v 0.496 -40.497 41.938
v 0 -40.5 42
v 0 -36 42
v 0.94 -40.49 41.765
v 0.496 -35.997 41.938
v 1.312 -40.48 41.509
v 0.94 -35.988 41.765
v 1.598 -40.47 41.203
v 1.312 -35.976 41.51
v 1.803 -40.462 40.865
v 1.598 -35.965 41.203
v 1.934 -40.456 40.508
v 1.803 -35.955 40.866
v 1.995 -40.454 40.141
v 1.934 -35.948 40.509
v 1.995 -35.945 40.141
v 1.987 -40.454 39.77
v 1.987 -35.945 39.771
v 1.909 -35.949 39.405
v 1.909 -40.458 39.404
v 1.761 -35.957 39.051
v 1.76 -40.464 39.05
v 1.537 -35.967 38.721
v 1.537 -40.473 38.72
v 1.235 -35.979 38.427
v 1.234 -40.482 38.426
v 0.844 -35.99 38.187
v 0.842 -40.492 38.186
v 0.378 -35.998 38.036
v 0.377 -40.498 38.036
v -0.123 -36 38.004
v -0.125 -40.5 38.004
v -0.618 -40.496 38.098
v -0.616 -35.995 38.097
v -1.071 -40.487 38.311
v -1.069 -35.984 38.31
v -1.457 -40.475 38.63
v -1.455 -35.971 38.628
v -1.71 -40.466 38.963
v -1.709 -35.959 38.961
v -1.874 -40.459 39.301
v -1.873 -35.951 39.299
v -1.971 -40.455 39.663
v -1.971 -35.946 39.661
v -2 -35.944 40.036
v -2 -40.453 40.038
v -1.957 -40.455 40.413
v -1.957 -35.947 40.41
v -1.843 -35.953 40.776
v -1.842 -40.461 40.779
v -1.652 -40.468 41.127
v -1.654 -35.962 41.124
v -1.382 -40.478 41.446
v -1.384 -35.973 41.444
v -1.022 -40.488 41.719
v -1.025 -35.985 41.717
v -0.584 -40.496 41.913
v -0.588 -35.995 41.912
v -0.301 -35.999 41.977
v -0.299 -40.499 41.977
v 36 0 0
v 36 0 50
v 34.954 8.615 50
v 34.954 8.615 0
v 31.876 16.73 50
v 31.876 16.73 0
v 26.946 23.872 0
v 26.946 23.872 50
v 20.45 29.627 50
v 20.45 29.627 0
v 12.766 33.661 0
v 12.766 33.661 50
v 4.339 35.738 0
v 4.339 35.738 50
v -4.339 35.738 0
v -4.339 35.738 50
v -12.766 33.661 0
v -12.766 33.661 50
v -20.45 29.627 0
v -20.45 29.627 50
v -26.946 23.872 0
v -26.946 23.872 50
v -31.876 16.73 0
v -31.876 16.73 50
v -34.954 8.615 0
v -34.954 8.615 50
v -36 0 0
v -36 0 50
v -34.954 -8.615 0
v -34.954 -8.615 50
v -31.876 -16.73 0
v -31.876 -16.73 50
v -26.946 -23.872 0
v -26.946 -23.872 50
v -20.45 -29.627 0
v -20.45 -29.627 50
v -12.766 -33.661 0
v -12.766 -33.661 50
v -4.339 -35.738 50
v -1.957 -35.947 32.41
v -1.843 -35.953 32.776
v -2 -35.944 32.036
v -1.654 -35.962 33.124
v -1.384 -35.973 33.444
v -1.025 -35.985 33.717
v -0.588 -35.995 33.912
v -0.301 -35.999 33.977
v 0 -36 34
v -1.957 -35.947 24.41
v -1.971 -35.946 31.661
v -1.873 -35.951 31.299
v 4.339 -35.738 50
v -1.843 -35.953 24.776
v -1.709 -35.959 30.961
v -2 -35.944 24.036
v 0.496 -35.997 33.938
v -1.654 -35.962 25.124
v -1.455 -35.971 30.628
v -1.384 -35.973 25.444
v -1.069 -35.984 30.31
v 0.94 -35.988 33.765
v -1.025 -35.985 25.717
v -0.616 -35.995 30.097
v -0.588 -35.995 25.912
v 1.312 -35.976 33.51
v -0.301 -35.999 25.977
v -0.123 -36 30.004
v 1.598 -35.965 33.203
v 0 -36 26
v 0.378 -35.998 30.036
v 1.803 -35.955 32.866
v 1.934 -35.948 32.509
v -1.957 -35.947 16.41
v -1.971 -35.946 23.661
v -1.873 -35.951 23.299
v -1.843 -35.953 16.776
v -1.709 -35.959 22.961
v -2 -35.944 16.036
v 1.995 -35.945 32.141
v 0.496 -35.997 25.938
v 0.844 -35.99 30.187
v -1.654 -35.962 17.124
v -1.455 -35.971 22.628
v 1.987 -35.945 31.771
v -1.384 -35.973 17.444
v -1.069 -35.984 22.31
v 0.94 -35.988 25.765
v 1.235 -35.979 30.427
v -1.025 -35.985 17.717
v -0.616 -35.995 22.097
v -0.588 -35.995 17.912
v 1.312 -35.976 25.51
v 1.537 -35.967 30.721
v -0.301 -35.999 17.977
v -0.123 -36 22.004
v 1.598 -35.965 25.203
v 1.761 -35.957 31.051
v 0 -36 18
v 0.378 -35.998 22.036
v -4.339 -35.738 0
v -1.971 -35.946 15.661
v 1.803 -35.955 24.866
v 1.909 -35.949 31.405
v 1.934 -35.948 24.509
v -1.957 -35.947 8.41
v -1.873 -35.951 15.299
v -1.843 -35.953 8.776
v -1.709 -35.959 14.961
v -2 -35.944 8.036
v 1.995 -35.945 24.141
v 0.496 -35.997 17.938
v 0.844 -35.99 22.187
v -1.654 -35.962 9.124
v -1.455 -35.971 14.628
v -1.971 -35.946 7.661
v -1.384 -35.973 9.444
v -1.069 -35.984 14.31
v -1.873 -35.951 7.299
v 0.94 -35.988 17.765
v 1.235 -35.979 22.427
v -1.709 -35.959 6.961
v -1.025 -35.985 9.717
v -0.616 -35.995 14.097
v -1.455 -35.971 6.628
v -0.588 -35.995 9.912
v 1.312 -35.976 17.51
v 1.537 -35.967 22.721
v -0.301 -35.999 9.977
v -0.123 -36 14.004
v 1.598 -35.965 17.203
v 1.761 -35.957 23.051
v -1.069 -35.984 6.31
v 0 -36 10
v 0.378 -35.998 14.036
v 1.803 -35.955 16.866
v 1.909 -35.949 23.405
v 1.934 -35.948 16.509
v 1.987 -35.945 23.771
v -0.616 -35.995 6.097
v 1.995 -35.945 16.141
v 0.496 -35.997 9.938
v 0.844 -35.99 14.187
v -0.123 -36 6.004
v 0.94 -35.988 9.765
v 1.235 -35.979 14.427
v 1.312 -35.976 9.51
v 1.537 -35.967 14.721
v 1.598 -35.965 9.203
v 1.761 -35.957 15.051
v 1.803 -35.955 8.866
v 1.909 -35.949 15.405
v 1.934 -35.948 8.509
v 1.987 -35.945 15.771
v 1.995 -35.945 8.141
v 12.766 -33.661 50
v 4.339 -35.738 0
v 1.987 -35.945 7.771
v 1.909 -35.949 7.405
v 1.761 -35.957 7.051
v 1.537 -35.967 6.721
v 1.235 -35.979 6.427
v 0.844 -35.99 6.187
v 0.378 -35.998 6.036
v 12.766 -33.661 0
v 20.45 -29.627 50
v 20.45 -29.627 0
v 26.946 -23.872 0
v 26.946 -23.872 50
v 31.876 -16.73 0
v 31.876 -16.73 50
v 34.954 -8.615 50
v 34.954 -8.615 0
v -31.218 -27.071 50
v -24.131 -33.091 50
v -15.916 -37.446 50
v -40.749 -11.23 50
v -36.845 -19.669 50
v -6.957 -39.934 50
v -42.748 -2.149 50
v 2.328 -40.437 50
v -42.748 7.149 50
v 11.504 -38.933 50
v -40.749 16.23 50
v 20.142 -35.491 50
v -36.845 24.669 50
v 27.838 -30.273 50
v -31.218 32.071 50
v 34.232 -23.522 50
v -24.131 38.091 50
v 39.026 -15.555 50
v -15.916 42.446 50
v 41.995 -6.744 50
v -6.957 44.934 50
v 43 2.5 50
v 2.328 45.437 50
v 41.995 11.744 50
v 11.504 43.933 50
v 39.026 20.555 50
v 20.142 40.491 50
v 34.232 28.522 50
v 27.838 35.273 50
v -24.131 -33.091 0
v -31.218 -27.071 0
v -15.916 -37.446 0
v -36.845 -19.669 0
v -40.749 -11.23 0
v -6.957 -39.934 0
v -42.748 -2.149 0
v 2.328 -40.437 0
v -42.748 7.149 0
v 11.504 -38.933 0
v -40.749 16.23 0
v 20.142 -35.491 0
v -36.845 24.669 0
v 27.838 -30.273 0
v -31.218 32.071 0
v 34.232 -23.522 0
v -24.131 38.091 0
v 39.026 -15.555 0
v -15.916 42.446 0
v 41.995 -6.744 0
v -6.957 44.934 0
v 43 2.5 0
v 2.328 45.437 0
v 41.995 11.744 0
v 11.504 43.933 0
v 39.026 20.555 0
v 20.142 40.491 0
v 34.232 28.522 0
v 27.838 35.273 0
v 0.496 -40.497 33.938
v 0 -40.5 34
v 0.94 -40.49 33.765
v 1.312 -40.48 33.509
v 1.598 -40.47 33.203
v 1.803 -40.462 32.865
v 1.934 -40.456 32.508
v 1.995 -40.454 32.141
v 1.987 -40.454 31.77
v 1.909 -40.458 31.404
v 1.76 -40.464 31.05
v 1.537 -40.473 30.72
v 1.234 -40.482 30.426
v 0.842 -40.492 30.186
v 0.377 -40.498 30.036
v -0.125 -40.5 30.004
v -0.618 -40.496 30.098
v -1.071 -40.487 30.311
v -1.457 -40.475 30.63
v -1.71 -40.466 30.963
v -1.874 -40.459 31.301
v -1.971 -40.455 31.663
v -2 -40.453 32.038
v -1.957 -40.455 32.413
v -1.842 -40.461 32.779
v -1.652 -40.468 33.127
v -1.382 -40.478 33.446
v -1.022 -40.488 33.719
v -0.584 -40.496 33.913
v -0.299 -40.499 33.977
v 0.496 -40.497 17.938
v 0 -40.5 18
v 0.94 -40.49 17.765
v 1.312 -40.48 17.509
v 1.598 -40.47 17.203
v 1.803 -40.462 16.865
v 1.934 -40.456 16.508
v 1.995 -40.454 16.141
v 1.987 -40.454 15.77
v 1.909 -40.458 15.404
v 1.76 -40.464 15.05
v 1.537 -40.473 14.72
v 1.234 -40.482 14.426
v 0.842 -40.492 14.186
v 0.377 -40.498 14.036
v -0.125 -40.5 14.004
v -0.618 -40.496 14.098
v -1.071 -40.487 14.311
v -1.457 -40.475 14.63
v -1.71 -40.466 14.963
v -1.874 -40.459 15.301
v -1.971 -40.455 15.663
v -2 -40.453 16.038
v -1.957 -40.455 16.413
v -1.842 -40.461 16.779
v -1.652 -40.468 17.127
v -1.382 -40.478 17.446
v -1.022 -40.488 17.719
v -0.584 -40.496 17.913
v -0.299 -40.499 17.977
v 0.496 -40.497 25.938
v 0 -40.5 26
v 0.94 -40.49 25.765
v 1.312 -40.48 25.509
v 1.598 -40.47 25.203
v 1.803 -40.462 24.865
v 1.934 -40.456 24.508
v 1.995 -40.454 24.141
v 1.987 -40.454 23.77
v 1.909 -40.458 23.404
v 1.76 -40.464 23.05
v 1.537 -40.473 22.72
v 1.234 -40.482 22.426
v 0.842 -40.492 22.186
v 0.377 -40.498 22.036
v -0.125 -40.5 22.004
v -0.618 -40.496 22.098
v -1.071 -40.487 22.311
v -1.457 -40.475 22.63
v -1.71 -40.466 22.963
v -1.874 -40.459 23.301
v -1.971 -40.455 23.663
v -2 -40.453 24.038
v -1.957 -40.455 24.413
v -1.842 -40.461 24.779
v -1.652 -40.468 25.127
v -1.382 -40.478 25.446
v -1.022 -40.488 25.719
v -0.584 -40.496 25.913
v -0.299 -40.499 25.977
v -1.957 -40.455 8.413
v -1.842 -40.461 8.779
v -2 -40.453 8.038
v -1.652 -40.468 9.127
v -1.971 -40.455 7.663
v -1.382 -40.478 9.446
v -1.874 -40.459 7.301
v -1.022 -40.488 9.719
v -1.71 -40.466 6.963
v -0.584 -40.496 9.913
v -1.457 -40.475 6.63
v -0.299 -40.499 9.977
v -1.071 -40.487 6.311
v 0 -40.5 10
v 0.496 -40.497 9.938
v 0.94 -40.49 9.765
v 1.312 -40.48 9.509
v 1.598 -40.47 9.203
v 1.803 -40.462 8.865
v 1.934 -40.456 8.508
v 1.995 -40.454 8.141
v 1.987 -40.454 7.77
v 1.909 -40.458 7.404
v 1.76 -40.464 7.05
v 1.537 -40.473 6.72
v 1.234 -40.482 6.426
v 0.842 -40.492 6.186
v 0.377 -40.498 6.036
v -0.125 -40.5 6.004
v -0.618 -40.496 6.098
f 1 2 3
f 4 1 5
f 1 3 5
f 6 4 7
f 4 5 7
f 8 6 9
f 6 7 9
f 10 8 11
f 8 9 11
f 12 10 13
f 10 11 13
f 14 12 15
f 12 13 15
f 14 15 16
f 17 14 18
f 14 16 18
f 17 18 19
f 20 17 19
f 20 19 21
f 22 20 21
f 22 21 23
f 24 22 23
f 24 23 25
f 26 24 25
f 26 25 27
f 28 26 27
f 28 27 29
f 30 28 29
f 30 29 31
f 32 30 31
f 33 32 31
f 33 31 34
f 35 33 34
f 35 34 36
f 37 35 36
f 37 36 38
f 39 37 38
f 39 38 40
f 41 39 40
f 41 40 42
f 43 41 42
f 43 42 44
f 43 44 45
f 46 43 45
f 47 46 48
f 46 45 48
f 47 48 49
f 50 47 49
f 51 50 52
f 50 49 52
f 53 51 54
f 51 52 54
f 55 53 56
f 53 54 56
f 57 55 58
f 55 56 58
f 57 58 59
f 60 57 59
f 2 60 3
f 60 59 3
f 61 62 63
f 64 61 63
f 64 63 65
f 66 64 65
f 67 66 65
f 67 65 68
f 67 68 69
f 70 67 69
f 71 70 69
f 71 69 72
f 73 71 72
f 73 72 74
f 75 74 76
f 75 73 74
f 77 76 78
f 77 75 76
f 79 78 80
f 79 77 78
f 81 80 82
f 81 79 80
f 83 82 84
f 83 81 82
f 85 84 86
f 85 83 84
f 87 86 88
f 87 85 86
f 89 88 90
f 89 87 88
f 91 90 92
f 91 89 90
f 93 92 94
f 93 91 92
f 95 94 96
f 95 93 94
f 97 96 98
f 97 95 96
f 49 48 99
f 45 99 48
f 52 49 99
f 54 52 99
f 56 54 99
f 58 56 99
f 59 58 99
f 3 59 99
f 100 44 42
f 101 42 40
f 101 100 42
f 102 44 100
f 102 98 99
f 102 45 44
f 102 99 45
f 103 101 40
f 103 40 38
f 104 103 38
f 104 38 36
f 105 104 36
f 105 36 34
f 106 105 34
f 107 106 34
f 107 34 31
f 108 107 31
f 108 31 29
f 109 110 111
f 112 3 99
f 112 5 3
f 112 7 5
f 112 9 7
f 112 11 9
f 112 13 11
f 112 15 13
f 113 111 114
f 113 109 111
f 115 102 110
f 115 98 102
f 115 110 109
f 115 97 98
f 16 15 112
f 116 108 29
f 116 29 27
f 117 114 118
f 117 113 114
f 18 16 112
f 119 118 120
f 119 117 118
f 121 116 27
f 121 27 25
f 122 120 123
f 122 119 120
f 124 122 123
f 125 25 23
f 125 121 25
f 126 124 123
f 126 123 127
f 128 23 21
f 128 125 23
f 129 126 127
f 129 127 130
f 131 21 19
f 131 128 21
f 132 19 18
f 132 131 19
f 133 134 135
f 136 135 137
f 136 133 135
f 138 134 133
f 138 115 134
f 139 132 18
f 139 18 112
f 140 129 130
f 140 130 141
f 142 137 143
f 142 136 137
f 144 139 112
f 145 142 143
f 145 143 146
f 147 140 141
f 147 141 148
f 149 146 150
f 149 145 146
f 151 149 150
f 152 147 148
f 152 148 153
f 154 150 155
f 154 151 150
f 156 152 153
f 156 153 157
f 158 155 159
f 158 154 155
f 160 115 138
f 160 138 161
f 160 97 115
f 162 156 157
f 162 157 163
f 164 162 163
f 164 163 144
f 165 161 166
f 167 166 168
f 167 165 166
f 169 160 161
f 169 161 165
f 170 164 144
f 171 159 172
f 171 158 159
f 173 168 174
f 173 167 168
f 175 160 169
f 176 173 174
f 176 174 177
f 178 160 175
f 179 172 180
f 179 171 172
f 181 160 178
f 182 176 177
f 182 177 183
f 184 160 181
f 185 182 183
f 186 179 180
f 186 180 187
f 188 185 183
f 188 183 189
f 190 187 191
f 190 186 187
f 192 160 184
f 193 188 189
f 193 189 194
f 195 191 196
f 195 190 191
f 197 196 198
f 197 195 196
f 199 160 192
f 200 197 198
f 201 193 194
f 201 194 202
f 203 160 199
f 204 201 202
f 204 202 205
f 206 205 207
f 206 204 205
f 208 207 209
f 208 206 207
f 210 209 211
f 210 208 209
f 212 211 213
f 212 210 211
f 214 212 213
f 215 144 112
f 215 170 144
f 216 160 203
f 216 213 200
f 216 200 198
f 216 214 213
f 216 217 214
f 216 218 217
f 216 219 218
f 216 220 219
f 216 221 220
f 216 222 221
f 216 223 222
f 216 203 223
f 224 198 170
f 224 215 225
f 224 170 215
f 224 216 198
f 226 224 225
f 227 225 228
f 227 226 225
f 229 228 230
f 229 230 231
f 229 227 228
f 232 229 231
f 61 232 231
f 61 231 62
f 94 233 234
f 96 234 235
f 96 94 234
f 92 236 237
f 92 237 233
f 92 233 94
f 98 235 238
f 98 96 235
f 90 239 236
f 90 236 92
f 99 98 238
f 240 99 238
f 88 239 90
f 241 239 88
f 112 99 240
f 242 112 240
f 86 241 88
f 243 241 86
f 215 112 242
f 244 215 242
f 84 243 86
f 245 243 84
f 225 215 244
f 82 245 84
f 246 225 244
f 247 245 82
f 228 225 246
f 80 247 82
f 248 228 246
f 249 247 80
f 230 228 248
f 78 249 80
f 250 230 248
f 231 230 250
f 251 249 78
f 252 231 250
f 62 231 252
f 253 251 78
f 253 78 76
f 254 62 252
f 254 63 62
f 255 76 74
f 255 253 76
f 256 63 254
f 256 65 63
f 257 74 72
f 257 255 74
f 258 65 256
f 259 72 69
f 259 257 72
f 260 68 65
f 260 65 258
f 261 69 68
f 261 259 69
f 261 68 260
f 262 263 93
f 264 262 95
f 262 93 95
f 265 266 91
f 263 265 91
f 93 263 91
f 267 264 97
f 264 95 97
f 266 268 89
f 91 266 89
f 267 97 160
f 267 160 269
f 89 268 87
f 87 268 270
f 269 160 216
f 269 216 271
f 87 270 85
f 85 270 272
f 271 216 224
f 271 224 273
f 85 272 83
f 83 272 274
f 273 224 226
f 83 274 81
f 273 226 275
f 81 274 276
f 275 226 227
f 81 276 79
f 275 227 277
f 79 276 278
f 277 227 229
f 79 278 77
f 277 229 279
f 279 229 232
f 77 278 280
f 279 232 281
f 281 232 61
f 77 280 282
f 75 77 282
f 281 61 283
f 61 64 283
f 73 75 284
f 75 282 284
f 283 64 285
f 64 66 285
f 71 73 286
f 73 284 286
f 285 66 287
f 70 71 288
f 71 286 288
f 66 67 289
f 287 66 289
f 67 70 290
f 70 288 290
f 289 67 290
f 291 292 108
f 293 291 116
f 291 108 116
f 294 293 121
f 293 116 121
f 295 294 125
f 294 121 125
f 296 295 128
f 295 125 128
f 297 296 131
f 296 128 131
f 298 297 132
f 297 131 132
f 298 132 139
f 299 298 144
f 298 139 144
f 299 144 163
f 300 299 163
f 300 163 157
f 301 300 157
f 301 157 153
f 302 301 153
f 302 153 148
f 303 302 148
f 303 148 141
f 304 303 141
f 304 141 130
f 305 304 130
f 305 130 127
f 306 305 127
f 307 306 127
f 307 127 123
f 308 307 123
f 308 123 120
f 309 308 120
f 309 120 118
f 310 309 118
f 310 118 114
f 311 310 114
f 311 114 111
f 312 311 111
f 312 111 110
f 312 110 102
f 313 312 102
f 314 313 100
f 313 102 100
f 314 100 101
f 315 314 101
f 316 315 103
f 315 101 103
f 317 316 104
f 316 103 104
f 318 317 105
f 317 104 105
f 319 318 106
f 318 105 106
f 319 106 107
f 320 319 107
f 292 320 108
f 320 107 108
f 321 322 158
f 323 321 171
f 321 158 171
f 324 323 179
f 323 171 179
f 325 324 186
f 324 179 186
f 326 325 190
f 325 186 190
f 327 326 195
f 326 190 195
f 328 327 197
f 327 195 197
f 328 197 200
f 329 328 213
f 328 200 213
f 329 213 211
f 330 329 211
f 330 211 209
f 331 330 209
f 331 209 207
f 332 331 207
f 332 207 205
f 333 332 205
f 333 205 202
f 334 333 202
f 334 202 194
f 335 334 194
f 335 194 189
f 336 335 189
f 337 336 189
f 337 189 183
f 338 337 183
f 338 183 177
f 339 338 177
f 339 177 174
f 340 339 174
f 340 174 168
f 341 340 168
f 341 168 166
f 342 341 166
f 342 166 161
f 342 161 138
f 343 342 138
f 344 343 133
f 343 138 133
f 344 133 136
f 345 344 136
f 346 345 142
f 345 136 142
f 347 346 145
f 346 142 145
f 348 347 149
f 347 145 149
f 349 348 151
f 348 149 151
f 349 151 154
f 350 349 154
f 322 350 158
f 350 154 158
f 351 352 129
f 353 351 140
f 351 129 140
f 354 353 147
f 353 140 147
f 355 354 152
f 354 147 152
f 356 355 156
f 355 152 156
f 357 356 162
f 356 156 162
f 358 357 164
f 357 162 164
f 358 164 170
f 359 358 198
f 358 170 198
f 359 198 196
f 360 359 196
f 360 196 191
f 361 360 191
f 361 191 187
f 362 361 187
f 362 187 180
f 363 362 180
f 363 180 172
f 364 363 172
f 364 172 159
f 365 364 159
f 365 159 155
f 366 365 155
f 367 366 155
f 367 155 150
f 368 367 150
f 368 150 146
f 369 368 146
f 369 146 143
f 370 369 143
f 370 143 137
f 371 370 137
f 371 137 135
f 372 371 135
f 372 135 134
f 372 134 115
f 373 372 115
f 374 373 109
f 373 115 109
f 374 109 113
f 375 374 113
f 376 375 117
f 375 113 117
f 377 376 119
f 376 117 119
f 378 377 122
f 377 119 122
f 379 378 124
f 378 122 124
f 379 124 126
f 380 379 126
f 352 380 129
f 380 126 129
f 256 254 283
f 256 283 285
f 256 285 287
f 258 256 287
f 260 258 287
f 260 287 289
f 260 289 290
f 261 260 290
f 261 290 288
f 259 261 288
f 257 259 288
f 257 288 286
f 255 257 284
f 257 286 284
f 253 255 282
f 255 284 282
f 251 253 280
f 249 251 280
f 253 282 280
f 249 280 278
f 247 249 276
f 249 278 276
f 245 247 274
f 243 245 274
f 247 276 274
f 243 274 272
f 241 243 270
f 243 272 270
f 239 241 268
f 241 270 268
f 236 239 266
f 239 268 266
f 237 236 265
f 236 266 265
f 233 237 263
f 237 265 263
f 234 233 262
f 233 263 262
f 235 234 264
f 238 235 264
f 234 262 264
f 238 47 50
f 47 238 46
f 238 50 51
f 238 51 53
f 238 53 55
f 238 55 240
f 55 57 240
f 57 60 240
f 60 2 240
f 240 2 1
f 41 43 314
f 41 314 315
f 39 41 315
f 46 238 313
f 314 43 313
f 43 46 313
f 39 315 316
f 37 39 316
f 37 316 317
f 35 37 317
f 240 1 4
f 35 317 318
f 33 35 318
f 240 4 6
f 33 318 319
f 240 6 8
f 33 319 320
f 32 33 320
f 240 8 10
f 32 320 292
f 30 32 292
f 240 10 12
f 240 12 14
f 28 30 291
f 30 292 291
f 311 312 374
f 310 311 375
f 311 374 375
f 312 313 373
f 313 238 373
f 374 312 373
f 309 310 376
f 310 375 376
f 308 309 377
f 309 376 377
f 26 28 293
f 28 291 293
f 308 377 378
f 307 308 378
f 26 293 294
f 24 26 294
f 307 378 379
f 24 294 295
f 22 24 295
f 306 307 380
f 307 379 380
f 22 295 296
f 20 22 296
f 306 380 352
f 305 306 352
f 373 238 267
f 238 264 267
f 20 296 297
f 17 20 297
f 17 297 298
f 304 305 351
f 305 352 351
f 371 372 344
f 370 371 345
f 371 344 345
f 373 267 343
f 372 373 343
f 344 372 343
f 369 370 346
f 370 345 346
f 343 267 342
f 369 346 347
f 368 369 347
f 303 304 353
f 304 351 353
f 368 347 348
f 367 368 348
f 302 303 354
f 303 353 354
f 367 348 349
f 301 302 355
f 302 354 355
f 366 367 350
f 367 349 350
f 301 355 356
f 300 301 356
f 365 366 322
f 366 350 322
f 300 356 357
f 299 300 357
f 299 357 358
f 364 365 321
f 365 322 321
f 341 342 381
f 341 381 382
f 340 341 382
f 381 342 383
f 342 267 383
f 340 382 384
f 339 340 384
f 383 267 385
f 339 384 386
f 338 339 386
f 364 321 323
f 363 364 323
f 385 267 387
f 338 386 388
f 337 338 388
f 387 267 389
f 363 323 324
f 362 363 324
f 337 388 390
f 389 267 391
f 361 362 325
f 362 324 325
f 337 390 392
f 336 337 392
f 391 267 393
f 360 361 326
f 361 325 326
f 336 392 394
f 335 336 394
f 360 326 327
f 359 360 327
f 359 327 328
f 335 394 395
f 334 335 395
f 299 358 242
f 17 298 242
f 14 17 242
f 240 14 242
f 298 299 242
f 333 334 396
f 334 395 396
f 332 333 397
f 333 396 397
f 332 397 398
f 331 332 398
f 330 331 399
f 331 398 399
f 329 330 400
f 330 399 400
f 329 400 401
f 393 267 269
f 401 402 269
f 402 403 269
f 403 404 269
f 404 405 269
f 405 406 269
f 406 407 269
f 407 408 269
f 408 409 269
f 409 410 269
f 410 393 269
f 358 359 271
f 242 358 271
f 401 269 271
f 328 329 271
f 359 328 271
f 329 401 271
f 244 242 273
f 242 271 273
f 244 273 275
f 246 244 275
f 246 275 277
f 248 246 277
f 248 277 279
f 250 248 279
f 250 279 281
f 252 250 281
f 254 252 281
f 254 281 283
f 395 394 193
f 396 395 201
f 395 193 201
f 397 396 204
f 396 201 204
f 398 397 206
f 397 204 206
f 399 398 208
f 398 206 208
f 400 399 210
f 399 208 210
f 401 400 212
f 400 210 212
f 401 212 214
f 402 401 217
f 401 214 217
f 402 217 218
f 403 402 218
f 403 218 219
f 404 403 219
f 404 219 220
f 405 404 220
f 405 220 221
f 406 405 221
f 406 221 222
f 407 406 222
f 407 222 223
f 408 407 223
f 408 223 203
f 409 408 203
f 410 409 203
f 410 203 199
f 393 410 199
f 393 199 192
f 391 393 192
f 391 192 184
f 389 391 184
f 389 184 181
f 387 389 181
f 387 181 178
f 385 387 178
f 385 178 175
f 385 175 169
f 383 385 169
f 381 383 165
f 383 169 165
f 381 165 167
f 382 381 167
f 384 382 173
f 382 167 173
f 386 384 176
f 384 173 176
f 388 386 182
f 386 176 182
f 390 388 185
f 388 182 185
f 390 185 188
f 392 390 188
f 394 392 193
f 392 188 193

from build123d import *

# Parameters (mm, degrees)
ESQUISSE1_R             = 43
ESQUISSE1_R_2           = 36
BASE_EXTRUSION_DEPTH    = 50
ESQUISSE2_R             = 2
ENL_V_MAT_EXTRU_1_DEPTH = 81.120222166


with BuildPart() as part:
    # Esquisse1 → Base-Extrusion (new body)
    with BuildSketch(Plane.XY):
        with Locations((0, 2.5)):
            Circle(ESQUISSE1_R)
        Circle(ESQUISSE1_R_2, mode=Mode.SUBTRACT)
    extrude(amount=BASE_EXTRUSION_DEPTH)

    # Esquisse2 → Enlèv. mat.-Extru.1 (cut, through all)
    with BuildSketch(Plane(origin=(0, 0, 0), x_dir=(1, 0, 0), z_dir=(0, 1, 0))):
        with Locations((0, -8)):
            Circle(ESQUISSE2_R)
        with Locations((0, -16)):
            Circle(ESQUISSE2_R)
        with Locations((0, -24)):
            Circle(ESQUISSE2_R)
        with Locations((0, -32)):
            Circle(ESQUISSE2_R)
        with Locations((0, -40)):
            Circle(ESQUISSE2_R)
        with Locations((0, 92)):
            Circle(ESQUISSE2_R)
        with Locations((0, 84)):
            Circle(ESQUISSE2_R)
        with Locations((0, 76)):
            Circle(ESQUISSE2_R)
        with Locations((0, 68)):
            Circle(ESQUISSE2_R)
        with Locations((0, 60)):
            Circle(ESQUISSE2_R)
        with Locations((0, 192)):
            Circle(ESQUISSE2_R)
        with Locations((0, 184)):
            Circle(ESQUISSE2_R)
        with Locations((0, 176)):
            Circle(ESQUISSE2_R)
        with Locations((0, 168)):
            Circle(ESQUISSE2_R)
        with Locations((0, 160)):
            Circle(ESQUISSE2_R)
        with Locations((0, 292)):
            Circle(ESQUISSE2_R)
        with Locations((0, 284)):
            Circle(ESQUISSE2_R)
        with Locations((0, 276)):
            Circle(ESQUISSE2_R)
        with Locations((0, 268)):
            Circle(ESQUISSE2_R)
        with Locations((0, 260)):
            Circle(ESQUISSE2_R)
        with Locations((0, 392)):
            Circle(ESQUISSE2_R)
        with Locations((0, 384)):
            Circle(ESQUISSE2_R)
        with Locations((0, 376)):
            Circle(ESQUISSE2_R)
        with Locations((0, 368)):
            Circle(ESQUISSE2_R)
        with Locations((0, 360)):
            Circle(ESQUISSE2_R)
    extrude(amount=-ENL_V_MAT_EXTRU_1_DEPTH, mode=Mode.SUBTRACT)


solid = part.part
